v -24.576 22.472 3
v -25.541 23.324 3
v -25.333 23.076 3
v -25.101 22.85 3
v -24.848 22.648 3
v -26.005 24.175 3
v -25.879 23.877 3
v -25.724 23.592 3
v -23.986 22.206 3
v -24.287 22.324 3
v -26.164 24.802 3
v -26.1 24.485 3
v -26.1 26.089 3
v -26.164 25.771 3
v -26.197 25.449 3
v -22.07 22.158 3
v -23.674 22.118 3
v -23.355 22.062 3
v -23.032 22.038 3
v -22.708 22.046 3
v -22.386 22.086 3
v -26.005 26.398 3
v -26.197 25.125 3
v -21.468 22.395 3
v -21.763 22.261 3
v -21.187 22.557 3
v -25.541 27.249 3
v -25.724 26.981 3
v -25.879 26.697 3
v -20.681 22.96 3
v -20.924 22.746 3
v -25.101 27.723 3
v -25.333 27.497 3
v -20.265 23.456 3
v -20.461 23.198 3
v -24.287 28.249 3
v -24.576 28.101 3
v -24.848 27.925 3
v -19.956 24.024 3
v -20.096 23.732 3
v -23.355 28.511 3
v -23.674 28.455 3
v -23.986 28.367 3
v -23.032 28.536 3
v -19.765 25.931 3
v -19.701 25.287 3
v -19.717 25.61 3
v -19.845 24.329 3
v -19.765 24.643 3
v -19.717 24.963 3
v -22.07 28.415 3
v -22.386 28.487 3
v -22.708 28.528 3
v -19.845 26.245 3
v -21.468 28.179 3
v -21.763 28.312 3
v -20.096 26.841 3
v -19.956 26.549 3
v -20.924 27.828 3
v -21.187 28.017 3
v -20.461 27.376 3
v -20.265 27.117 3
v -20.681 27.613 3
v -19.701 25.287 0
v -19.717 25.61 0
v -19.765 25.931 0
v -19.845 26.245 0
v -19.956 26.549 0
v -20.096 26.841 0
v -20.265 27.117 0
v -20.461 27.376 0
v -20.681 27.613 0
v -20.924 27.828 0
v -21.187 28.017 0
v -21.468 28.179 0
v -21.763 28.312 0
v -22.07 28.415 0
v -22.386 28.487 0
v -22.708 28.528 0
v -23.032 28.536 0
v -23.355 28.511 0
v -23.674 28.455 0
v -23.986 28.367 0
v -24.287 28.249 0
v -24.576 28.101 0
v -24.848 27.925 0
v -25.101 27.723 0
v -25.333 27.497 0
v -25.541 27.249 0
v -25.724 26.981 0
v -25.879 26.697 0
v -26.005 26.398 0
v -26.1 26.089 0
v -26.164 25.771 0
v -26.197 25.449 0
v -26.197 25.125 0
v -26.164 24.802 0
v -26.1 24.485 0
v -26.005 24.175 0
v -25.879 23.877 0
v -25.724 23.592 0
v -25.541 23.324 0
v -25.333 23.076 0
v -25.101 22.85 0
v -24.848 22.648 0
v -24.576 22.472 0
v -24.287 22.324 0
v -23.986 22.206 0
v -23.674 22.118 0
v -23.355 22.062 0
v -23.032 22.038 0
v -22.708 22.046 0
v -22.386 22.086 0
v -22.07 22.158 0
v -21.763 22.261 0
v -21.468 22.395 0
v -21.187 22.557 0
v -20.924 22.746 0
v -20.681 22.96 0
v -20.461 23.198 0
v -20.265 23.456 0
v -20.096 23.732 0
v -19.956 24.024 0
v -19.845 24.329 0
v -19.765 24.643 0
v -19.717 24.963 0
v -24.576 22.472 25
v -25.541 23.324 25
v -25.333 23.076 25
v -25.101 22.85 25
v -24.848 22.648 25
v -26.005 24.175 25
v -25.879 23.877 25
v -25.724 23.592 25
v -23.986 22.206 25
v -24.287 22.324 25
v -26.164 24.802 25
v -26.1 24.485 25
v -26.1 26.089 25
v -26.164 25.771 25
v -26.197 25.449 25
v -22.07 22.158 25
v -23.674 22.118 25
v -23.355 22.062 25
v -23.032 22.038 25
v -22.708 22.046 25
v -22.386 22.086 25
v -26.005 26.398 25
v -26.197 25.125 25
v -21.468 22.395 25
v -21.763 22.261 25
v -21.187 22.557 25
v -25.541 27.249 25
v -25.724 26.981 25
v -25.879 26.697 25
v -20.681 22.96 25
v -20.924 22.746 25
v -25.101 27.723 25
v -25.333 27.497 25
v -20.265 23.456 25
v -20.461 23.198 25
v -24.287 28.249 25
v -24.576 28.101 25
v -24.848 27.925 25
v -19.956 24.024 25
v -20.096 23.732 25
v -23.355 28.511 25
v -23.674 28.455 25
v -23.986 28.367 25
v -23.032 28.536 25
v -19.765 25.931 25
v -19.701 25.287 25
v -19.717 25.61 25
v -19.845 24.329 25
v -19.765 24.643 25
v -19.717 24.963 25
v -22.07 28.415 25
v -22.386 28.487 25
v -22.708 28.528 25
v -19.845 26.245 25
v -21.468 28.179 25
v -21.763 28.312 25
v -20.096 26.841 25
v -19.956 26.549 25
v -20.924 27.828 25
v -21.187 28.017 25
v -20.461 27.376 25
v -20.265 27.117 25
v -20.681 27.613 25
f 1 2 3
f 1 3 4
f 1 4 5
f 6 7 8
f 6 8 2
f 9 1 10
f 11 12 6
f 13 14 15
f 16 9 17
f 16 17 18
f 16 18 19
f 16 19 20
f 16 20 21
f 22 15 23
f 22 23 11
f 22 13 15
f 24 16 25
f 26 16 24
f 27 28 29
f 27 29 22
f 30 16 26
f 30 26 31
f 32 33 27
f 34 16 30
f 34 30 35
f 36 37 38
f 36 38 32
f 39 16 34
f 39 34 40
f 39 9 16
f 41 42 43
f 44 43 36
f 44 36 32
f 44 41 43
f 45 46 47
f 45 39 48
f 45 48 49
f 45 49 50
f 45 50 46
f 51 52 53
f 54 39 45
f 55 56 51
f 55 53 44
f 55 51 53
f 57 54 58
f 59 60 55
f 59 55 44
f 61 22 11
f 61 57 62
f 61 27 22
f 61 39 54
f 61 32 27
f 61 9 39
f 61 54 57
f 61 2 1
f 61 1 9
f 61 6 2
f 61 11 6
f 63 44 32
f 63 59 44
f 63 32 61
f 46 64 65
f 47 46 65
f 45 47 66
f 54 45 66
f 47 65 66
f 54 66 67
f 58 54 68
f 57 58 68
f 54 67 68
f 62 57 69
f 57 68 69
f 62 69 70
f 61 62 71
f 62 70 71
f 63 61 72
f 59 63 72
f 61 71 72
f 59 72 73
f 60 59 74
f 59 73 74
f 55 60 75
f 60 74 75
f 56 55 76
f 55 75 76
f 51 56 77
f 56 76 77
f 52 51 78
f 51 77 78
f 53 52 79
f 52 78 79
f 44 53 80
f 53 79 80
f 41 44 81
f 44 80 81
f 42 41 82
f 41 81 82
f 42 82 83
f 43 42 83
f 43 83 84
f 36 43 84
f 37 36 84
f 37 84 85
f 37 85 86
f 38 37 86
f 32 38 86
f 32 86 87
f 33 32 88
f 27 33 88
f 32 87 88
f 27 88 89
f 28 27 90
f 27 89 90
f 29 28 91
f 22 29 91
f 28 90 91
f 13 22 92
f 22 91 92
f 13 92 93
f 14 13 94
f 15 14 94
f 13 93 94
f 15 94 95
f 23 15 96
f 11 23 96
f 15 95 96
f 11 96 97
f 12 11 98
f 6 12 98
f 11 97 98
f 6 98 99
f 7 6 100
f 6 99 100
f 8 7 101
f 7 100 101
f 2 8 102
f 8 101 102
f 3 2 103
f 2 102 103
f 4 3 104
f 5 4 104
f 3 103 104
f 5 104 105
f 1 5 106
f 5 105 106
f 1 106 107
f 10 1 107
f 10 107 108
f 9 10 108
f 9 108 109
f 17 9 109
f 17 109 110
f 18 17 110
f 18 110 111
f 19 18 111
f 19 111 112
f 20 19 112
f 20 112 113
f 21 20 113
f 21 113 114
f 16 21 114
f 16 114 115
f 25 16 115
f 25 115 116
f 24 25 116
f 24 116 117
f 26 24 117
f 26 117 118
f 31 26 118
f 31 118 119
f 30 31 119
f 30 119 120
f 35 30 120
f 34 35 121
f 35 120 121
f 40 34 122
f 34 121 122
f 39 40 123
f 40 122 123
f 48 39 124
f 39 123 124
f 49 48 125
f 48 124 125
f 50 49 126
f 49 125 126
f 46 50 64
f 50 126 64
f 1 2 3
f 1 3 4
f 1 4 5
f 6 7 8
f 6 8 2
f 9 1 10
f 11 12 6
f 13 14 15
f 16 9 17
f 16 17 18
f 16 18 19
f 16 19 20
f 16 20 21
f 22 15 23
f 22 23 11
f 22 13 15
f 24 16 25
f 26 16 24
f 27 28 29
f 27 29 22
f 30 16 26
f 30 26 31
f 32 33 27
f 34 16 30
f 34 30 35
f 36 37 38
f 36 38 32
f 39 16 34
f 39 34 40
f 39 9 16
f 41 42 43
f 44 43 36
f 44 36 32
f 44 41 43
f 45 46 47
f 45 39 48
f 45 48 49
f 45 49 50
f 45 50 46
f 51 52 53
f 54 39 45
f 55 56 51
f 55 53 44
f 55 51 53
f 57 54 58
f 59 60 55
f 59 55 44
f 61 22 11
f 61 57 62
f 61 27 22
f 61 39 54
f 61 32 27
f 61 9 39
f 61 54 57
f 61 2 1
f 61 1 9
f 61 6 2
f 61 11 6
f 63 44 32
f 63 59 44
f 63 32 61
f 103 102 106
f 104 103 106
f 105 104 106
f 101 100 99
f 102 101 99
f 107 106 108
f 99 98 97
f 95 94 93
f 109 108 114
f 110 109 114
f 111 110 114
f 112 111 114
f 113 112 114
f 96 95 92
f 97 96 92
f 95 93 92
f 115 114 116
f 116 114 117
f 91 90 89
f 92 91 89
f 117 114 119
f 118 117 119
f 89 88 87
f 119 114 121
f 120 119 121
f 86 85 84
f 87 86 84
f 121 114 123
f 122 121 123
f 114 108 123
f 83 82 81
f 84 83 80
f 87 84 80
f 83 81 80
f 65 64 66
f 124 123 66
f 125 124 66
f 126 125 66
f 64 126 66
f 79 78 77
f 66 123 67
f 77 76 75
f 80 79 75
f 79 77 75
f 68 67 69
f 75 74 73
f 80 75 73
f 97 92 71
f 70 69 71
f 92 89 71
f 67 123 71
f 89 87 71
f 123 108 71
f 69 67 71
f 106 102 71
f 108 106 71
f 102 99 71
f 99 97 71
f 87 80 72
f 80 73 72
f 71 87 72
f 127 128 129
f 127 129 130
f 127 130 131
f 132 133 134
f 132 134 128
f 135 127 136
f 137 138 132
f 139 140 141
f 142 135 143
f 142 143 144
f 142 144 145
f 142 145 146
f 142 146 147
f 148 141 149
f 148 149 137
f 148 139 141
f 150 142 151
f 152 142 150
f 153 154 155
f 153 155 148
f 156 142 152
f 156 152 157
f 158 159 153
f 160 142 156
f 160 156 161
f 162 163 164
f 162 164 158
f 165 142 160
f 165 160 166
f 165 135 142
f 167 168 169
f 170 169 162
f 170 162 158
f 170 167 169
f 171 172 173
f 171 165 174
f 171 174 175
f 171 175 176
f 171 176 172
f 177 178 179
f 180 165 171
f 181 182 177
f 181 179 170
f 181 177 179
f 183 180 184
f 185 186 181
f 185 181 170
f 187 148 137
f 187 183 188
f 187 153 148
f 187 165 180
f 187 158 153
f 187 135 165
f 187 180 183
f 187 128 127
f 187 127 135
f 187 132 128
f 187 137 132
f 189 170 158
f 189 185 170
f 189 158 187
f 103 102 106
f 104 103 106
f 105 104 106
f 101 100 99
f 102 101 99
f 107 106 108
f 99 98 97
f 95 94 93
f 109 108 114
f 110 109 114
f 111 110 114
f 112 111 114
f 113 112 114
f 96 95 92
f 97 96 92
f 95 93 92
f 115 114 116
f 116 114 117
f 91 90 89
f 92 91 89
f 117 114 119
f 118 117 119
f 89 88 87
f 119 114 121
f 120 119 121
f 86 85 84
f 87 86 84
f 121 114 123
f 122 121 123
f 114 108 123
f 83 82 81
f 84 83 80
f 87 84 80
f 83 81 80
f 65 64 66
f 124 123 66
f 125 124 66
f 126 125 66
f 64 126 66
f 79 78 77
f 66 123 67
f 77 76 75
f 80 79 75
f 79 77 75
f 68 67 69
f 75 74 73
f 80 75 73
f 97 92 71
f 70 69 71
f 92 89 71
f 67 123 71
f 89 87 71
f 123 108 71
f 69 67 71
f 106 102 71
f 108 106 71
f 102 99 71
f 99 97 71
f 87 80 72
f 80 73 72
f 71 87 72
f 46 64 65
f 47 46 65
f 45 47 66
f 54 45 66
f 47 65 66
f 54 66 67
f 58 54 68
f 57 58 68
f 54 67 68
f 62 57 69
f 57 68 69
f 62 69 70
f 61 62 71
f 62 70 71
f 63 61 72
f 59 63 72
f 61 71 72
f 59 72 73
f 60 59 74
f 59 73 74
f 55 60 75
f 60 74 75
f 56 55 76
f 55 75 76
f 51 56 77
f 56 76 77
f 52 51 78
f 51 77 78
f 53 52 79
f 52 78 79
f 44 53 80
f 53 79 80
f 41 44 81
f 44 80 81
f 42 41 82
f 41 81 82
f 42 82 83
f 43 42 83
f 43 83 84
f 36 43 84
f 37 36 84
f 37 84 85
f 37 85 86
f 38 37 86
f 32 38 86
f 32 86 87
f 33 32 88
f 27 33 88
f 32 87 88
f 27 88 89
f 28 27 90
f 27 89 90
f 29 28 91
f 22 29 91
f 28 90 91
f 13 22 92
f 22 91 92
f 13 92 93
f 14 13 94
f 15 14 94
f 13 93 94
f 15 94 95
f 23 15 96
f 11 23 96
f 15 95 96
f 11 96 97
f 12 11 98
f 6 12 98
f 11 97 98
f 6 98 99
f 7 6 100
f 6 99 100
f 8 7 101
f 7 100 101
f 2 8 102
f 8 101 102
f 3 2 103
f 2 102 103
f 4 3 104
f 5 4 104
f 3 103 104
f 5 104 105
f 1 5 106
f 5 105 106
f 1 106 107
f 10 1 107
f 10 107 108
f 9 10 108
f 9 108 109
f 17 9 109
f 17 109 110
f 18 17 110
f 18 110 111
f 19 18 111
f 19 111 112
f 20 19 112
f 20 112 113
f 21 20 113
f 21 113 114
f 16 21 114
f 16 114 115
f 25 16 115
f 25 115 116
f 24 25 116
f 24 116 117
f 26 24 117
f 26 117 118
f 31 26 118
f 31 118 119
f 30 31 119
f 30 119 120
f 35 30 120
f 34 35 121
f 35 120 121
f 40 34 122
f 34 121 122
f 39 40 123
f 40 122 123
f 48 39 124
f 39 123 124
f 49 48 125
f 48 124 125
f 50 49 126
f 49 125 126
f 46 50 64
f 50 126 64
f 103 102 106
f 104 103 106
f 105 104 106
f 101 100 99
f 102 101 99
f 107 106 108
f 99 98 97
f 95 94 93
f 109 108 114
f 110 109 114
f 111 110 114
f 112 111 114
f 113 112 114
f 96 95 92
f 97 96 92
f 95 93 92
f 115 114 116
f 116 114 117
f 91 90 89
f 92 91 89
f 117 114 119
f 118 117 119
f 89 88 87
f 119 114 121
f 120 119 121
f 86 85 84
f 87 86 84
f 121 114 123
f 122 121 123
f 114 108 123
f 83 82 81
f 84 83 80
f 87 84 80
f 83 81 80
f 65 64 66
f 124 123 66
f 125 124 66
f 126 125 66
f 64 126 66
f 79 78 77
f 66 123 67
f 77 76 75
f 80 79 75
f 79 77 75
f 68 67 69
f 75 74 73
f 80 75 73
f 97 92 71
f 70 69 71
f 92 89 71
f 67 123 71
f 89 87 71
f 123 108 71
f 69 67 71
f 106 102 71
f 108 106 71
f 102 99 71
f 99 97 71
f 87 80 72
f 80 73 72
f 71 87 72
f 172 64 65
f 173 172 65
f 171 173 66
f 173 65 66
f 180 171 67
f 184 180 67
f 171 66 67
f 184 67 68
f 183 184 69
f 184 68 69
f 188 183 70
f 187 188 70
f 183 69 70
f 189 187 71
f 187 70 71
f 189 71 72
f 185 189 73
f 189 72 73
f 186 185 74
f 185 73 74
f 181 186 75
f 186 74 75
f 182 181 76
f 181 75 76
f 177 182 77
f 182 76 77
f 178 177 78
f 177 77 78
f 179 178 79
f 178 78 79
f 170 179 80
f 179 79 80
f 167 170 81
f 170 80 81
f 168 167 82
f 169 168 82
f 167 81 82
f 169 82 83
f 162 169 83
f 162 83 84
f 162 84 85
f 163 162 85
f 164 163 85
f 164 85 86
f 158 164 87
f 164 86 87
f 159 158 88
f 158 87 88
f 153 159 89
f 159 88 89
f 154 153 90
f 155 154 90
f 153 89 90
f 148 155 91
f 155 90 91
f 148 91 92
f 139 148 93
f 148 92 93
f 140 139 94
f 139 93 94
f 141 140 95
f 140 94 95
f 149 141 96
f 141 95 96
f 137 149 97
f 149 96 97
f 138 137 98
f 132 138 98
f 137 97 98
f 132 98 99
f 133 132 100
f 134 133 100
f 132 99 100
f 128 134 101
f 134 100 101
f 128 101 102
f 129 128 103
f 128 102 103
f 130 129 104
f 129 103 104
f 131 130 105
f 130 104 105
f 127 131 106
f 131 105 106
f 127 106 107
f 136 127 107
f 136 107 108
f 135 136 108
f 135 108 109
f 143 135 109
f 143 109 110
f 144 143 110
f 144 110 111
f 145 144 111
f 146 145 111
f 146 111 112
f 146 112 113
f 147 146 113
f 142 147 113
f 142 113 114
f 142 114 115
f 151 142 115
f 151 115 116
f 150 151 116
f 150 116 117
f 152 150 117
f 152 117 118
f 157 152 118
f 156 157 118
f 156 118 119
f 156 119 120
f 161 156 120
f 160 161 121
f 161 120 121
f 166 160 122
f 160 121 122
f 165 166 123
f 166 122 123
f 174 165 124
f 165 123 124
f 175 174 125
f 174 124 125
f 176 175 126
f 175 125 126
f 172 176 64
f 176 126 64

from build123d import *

# Parameters (mm, degrees)
F0_R     = 3.25
F1_DEPTH = 25
F2_DEPTH = 3
F3_DEPTH = 3


with BuildPart() as f1:
    # F0 (on Top) → F1 (new body)
    with BuildSketch(Plane.XY):
        with Locations((-22.950623, 25.286699)):
            Circle(F0_R)
    extrude(amount=F1_DEPTH)


with BuildPart() as f2:
    # F0 (on Top) → F2 (new body)
    with BuildSketch(Plane.XY):
        with Locations((-22.950623, 25.286699)):
            Circle(F0_R)
    extrude(amount=F2_DEPTH)


with BuildPart() as f3:
    # F0 (on Top) → F3 (new body)
    with BuildSketch(Plane.XY):
        with Locations((-22.950623, 25.286699)):
            Circle(F0_R)
    extrude(amount=F3_DEPTH)


solid = Compound([f1.part, f2.part, f3.part])
